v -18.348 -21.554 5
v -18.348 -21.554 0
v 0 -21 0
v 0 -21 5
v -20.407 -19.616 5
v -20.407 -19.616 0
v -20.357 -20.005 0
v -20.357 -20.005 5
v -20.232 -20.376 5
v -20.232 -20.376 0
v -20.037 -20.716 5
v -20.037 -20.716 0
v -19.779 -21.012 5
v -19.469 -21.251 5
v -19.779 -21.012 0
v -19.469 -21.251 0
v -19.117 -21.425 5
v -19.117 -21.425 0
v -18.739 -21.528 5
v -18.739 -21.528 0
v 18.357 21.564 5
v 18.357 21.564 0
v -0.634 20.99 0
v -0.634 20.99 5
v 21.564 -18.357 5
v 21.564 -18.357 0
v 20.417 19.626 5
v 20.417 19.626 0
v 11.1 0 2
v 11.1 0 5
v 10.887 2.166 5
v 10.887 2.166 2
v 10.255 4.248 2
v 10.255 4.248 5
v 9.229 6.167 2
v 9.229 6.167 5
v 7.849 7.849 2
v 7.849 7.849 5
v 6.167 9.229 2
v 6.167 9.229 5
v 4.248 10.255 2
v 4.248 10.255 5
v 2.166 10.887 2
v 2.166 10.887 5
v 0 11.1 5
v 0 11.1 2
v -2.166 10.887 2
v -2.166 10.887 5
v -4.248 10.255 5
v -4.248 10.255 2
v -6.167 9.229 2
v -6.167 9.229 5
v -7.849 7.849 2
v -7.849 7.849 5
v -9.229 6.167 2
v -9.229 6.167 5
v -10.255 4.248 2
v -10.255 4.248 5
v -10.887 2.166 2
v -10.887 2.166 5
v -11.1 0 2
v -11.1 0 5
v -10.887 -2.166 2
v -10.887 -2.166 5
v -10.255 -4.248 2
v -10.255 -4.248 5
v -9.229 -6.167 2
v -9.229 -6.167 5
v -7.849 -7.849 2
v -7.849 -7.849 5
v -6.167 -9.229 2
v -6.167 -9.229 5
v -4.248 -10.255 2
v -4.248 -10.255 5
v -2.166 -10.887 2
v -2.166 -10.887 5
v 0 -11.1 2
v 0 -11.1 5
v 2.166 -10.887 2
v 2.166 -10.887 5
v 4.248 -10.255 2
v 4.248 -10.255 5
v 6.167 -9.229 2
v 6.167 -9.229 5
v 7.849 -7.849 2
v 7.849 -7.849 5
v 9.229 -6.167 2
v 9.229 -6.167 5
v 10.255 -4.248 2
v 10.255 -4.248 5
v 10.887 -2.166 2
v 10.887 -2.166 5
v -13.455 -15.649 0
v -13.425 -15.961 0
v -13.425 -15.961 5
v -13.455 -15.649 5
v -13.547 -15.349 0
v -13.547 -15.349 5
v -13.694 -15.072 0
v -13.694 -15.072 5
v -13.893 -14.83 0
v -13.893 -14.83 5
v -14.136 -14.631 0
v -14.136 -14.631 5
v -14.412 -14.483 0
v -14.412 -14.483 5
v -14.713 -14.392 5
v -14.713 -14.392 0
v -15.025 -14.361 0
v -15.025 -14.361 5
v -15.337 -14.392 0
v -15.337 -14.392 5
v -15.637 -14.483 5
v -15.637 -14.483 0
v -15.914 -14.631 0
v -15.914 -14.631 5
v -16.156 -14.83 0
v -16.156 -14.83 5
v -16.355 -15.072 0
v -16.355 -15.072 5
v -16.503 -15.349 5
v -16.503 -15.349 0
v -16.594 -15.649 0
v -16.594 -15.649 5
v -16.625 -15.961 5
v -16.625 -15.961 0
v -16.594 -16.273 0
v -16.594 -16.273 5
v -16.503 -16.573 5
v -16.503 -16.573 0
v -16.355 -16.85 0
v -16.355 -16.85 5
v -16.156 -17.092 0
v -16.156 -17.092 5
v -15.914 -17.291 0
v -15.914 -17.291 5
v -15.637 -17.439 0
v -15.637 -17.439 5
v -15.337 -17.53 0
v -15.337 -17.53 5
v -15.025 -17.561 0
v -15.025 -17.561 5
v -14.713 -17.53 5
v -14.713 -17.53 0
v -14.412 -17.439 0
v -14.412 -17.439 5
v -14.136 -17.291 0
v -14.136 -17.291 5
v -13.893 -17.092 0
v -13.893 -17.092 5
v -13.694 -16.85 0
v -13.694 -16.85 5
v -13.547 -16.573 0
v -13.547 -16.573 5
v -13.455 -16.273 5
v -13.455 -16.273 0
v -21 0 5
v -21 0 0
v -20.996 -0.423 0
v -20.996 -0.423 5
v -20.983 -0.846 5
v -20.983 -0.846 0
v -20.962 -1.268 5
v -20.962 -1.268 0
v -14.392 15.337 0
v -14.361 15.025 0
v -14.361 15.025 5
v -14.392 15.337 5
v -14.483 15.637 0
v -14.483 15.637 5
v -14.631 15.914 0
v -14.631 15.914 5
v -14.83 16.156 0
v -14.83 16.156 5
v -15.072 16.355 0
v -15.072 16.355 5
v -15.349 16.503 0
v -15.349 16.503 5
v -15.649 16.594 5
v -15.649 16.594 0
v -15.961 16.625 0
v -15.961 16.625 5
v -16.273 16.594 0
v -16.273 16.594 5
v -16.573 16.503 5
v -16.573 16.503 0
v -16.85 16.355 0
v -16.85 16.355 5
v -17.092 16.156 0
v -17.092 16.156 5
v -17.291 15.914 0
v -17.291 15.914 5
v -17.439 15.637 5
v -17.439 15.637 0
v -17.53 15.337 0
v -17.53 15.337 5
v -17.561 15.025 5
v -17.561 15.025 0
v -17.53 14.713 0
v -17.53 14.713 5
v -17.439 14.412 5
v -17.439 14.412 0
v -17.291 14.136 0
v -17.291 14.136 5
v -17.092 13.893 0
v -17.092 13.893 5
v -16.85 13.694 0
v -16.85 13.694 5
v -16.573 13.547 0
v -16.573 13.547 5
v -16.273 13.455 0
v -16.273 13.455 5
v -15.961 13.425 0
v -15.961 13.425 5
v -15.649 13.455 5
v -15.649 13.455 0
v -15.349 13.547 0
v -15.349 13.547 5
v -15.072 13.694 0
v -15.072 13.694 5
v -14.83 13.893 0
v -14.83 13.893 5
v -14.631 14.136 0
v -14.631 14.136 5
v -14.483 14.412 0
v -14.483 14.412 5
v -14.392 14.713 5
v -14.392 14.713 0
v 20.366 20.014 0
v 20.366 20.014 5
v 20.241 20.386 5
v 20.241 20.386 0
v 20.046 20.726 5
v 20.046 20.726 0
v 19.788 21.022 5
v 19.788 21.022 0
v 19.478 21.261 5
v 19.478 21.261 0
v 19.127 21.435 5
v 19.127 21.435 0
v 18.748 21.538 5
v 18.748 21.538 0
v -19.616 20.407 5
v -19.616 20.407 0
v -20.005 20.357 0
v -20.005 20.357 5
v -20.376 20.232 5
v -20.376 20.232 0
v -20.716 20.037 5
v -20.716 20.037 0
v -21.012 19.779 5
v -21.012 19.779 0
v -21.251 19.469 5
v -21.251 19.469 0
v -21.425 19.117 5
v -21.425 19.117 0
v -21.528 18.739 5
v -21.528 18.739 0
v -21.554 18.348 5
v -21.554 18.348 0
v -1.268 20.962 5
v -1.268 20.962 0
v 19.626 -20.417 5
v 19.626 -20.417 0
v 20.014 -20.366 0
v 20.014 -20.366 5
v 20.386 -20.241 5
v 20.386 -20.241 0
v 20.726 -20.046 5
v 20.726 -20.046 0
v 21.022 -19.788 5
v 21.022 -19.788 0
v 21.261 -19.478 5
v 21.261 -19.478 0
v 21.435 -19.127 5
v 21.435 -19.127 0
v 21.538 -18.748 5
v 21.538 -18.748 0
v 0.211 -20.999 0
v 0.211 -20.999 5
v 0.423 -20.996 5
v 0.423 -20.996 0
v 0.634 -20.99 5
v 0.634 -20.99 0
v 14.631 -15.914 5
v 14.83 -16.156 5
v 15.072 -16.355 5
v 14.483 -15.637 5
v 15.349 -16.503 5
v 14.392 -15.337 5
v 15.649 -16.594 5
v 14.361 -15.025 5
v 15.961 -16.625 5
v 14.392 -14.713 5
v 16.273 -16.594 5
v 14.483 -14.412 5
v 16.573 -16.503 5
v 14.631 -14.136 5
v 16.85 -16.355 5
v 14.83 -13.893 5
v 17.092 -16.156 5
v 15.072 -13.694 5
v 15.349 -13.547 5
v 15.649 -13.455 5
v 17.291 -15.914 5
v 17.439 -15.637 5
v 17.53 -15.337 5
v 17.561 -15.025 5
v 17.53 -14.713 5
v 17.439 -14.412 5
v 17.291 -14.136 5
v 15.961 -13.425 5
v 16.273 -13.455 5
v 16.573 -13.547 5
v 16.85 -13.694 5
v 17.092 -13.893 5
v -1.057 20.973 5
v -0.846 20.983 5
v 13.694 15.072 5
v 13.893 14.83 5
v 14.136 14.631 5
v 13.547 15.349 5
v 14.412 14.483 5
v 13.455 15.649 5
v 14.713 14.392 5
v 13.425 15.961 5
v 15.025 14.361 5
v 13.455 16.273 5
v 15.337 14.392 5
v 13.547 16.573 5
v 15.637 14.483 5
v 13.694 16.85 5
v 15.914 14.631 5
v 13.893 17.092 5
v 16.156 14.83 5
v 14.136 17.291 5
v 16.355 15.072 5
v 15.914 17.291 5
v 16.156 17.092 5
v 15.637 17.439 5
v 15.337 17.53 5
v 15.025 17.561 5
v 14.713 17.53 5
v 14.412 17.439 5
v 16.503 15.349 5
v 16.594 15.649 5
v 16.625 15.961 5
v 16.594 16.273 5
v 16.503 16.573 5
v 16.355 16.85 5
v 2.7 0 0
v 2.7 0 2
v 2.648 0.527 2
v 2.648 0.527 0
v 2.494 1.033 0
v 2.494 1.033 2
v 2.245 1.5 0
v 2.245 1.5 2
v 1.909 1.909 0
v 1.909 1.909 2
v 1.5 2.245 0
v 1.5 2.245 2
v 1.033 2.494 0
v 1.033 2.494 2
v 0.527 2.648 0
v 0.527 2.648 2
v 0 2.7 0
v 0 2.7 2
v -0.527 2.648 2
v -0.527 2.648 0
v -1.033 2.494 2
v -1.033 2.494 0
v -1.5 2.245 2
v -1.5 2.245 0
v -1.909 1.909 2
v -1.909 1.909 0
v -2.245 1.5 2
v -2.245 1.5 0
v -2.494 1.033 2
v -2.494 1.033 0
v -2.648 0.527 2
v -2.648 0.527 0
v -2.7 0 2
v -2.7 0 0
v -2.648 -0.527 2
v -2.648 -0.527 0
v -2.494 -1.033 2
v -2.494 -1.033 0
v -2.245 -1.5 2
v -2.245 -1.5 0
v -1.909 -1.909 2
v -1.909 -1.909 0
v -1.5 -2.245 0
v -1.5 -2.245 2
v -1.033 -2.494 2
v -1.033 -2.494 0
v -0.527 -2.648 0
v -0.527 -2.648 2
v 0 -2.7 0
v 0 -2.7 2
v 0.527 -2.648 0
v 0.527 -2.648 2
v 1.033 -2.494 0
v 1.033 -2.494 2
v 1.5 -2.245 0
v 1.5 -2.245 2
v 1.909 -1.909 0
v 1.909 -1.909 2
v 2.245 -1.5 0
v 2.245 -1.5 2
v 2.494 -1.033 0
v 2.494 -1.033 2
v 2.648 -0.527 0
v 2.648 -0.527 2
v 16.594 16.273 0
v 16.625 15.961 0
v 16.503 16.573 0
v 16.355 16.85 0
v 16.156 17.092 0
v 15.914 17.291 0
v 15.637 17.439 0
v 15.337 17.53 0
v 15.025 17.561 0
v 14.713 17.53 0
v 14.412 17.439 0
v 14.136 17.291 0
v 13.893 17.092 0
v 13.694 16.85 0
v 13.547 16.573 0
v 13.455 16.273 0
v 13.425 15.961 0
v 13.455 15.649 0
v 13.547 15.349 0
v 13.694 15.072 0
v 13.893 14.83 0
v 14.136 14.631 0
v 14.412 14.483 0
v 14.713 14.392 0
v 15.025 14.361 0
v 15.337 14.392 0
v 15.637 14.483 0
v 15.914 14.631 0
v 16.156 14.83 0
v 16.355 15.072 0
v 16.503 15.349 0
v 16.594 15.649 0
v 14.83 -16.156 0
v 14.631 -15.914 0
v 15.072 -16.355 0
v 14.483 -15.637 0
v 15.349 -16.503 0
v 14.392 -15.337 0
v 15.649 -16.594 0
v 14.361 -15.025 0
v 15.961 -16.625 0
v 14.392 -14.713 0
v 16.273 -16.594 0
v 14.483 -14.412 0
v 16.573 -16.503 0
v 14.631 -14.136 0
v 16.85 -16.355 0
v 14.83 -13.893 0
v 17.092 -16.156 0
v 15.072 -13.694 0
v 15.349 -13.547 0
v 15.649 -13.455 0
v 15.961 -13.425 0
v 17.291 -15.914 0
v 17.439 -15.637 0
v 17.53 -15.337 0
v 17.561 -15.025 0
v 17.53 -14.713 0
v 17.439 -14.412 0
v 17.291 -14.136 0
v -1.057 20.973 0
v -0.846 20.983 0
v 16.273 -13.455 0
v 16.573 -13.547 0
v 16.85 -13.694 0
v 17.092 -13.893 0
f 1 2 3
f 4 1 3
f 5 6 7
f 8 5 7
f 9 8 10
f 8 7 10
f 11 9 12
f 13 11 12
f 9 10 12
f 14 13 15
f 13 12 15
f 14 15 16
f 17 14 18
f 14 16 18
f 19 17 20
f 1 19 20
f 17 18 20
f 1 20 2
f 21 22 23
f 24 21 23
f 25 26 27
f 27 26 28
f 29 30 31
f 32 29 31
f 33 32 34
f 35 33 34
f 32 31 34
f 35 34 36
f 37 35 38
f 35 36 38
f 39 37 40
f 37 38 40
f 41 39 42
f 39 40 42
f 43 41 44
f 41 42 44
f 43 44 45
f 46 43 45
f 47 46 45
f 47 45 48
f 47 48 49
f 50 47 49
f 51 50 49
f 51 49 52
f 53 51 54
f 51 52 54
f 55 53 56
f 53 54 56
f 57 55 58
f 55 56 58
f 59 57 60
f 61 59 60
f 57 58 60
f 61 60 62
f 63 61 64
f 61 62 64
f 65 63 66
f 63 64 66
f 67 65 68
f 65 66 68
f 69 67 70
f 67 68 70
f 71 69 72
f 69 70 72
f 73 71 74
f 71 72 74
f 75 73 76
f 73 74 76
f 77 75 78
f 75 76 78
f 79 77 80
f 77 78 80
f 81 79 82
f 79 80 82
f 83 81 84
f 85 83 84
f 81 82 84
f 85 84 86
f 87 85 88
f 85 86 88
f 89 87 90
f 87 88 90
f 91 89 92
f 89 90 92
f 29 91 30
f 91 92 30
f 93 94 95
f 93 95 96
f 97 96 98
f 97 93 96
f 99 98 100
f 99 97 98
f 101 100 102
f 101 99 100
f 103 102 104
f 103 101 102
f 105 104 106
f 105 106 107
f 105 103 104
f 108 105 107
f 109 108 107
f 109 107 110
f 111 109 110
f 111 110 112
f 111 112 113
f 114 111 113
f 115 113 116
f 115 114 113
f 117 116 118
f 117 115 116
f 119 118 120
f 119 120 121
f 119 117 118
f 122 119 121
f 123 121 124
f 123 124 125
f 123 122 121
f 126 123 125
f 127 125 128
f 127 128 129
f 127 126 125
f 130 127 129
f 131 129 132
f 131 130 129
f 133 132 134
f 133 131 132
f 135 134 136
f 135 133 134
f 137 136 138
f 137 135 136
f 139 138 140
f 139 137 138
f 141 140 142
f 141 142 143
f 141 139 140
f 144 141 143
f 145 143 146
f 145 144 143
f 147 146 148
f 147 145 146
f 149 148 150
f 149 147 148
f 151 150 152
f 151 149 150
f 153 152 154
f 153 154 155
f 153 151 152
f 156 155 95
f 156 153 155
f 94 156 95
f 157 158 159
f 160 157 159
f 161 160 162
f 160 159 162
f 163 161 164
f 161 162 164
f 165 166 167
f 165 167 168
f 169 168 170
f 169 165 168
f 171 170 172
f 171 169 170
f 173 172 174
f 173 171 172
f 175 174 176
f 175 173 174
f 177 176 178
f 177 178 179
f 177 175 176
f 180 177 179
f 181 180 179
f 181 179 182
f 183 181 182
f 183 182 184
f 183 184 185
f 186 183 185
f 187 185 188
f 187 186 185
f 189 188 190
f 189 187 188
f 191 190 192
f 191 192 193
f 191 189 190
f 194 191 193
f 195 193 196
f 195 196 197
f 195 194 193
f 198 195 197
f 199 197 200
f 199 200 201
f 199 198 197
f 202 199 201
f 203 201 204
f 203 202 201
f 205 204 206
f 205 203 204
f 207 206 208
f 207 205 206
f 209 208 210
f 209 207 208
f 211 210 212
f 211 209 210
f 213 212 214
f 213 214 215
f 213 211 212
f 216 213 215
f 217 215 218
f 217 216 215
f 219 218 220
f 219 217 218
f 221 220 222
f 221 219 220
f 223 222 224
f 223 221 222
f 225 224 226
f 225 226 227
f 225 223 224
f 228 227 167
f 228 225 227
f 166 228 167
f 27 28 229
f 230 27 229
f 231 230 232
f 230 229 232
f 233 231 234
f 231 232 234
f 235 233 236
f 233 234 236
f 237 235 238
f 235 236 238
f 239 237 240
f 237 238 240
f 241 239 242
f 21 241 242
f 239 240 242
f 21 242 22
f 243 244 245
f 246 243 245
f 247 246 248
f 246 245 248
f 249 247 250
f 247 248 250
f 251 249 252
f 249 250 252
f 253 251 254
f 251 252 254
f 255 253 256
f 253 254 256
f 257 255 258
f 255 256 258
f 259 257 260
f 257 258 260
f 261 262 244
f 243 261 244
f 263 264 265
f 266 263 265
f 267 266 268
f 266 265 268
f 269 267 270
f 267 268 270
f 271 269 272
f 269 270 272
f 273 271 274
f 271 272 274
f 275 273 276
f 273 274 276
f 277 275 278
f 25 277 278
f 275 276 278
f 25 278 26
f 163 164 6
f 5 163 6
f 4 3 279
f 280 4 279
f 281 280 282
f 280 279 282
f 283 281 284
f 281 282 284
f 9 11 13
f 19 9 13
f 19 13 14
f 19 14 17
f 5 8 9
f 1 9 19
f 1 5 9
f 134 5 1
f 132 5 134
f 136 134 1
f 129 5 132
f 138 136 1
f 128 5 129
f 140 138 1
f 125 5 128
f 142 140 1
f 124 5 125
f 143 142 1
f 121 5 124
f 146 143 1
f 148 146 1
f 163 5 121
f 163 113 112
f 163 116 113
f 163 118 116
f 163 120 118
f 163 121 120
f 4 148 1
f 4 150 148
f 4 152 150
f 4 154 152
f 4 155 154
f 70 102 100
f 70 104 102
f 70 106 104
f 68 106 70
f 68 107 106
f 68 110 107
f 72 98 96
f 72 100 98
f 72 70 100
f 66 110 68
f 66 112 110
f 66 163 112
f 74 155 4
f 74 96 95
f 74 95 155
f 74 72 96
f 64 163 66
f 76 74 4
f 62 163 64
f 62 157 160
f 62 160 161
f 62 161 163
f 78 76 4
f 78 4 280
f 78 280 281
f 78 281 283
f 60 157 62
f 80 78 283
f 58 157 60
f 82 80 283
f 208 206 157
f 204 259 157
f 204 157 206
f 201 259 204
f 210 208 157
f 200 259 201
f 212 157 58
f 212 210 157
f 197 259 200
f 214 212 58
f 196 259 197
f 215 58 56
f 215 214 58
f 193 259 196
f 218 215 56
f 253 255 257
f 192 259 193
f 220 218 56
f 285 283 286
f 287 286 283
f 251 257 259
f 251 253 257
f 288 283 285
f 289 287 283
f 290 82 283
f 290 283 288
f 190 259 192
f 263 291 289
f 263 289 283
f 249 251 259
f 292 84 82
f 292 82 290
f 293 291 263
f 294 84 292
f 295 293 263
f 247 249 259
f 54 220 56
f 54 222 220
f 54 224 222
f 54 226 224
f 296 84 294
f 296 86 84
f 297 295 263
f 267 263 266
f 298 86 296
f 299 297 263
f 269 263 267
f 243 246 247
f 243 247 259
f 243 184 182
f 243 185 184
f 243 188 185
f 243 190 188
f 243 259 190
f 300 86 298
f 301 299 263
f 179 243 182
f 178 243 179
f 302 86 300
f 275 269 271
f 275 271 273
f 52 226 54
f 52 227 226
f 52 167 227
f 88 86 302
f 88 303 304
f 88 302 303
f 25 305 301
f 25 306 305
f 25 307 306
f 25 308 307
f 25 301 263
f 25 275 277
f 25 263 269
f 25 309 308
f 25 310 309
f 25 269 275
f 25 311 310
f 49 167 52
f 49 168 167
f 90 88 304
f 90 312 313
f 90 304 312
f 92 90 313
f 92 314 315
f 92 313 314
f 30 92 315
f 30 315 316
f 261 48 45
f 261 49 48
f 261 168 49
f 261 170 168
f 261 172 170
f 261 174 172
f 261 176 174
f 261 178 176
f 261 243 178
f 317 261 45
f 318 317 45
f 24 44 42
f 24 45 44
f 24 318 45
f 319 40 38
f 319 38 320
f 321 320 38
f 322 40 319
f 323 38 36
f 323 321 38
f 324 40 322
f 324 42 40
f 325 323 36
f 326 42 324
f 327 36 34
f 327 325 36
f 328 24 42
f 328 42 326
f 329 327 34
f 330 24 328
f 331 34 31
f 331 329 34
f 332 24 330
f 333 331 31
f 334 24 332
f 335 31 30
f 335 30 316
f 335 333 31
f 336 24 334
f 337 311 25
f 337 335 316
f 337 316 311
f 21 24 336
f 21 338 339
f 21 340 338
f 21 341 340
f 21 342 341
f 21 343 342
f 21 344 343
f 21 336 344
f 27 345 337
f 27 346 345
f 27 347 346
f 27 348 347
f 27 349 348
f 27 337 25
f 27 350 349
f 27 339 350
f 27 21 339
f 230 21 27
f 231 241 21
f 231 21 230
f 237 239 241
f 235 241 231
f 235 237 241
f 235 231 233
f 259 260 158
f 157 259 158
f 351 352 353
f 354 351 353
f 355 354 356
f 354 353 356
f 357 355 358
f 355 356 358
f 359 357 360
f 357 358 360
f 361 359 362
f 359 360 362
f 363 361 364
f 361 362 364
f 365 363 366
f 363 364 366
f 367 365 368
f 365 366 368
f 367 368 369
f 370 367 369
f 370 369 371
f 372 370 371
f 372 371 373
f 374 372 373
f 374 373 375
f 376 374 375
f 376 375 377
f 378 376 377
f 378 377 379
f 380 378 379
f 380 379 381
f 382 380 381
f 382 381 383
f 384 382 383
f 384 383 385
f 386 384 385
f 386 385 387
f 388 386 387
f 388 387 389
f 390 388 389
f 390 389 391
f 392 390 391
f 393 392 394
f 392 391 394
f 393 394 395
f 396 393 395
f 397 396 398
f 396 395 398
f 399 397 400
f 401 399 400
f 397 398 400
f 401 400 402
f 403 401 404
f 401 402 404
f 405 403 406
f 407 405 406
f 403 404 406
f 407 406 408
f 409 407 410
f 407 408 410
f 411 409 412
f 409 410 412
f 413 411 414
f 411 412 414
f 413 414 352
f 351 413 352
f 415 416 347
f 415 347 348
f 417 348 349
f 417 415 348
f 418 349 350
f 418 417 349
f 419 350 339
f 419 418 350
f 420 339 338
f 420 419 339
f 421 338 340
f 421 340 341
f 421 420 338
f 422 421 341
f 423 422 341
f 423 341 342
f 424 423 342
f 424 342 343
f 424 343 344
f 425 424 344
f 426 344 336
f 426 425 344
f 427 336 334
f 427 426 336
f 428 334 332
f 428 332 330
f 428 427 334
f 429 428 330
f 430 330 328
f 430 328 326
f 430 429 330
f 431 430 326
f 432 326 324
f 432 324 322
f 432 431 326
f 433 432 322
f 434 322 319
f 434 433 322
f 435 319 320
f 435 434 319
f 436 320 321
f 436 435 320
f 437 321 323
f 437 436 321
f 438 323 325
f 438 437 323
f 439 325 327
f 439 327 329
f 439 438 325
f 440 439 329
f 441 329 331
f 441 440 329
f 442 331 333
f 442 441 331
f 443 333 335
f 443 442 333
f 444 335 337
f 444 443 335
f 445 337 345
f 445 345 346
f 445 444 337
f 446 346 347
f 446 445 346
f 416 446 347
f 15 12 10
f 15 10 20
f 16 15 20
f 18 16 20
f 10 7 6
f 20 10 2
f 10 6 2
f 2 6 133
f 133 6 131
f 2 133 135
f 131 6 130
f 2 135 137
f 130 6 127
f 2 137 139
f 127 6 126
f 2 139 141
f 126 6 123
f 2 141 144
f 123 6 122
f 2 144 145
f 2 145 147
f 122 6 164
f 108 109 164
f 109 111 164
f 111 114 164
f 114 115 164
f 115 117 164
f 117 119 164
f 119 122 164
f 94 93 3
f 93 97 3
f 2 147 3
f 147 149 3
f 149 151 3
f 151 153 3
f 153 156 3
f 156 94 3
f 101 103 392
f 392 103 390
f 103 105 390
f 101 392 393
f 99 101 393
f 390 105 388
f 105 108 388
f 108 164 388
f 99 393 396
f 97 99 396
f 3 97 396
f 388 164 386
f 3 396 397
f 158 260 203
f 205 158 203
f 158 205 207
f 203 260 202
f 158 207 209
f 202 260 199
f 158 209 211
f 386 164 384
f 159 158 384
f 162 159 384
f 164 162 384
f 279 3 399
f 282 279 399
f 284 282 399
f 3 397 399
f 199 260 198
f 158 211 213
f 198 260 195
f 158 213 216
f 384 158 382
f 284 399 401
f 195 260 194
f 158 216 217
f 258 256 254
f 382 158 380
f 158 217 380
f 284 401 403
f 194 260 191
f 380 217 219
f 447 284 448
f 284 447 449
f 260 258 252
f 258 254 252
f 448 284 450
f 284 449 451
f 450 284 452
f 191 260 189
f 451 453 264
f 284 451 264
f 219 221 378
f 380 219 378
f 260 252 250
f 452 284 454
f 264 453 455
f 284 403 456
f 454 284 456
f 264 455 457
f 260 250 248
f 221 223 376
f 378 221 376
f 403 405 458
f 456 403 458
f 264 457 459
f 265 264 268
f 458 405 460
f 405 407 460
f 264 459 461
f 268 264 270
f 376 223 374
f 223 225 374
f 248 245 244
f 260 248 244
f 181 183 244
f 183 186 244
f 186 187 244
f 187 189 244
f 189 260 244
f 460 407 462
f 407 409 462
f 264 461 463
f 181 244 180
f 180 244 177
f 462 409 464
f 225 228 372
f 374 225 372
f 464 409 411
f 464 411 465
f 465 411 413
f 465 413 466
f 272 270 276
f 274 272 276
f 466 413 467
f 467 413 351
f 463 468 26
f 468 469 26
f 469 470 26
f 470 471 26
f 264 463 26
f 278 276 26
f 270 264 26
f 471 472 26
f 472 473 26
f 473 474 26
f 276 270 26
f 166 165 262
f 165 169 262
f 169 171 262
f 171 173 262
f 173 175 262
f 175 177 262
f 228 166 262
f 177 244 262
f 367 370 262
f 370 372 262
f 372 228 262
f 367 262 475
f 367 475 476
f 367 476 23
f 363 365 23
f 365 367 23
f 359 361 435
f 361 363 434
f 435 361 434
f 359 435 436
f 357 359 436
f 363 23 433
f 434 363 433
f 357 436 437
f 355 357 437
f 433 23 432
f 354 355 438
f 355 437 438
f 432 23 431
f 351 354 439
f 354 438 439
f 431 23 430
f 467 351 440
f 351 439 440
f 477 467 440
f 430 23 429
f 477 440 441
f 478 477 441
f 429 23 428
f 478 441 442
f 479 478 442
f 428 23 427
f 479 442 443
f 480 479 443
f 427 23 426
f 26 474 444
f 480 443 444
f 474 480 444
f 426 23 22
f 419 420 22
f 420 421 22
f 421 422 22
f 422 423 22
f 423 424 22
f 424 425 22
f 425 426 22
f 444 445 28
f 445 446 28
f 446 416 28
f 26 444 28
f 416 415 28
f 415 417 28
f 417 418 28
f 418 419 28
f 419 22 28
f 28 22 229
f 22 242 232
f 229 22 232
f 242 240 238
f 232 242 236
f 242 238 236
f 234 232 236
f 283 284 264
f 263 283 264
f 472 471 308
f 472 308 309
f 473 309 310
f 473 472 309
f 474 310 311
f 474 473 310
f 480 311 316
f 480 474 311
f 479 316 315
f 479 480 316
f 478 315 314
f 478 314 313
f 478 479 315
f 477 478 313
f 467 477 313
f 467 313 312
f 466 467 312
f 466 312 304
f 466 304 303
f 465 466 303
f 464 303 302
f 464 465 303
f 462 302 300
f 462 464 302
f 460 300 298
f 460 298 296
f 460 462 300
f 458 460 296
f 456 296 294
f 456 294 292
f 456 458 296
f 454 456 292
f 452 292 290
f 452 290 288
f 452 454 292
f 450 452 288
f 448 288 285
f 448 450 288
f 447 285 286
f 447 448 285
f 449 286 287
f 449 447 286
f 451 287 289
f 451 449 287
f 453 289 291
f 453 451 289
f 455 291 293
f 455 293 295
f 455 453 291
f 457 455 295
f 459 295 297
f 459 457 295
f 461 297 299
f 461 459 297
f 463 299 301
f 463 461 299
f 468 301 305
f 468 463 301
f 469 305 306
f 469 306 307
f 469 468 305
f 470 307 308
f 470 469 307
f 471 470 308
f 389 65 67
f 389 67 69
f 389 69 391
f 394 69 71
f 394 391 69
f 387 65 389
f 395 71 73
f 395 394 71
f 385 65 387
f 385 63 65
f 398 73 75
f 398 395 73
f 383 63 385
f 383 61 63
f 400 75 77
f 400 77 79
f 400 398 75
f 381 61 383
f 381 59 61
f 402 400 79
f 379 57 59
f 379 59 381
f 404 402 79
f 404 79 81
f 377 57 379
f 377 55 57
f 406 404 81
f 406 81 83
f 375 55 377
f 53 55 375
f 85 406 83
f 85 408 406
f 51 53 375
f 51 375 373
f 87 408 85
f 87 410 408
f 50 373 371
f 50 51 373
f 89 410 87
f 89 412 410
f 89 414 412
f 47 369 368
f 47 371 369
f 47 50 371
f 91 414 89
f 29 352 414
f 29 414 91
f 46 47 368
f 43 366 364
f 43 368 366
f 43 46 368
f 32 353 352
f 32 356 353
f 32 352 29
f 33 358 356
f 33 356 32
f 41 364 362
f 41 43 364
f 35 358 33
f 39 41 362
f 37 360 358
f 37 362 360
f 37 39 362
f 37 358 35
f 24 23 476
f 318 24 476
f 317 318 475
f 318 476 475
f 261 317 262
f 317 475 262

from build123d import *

# Parameters (mm, degrees)
SKETCH1_R           = 1.6
BOSS_EXTRUDE1_DEPTH = 5
SKETCH3_R           = 11.1
CUT_EXTRUDE1_DEPTH  = 3
SKETCH4_R           = 2.7
CUT_EXTRUDE2_DEPTH  = 3


with BuildPart() as part:
    # Sketch1 → Boss-Extrude1 (new body)
    with BuildSketch(Plane.XY):
        with BuildLine():
            Line((18.357006817, 21.564329359), (-0.634323451, 20.990417665))
            ThreePointArc((-0.634323451, 20.990417665), (-0.95130426, 20.978441796), (-1.268068016, 20.961679406))
            Line((-1.268068016, 20.961679406), (-19.615786314, 20.407217452))
            ThreePointArc((-19.615786314, 20.407217452), (-21.011660375, 19.778980746), (-21.554461954, 18.347718298))
            Line((-21.554461954, 18.347718298), (-21, 0))
            ThreePointArc((-21, 0), (-20.990417665, -0.634323451), (-20.961679406, -1.268068016))
            Line((-20.961679406, -1.268068016), (-20.407217422, -19.615787304))
            ThreePointArc((-20.407217422, -19.615787304), (-19.778980677, -21.011661401), (-18.34771816, -21.55446294))
            Line((-18.34771816, -21.55446294), (0, -21))
            ThreePointArc((0, -21), (0.317197912, -20.99760428), (0.634323451, -20.990417665))
            Line((0.634323451, -20.990417665), (19.62565372, -20.416505971))
            ThreePointArc((19.62565372, -20.416505971), (21.02152778, -19.788269266), (21.564329359, -18.357006817))
            Line((21.564329359, -18.357006817), (20.416505971, 19.62565372))
            ThreePointArc((20.416505971, 19.62565372), (19.788269266, 21.02152778), (18.357006817, 21.564329359))
        make_face()
        with Locations((15.024736206, 15.961118443)):
            Circle(SKETCH1_R, mode=Mode.SUBTRACT)
        with Locations((15.961118443, -15.024736206)):
            Circle(SKETCH1_R, mode=Mode.SUBTRACT)
        with Locations((-15.024736206, -15.961118443)):
            Circle(SKETCH1_R, mode=Mode.SUBTRACT)
        with Locations((-15.961118443, 15.024736206)):
            Circle(SKETCH1_R, mode=Mode.SUBTRACT)
    extrude(amount=BOSS_EXTRUDE1_DEPTH)

    # Sketch3 → Cut-Extrude1 (cut)
    with BuildSketch(Plane.XY.offset(5)):
        Circle(SKETCH3_R)
    extrude(amount=-CUT_EXTRUDE1_DEPTH, mode=Mode.SUBTRACT)

    # Sketch4 → Cut-Extrude2 (cut)
    with BuildSketch(Plane.XY.offset(2)):
        Circle(SKETCH4_R)
    extrude(amount=-CUT_EXTRUDE2_DEPTH, mode=Mode.SUBTRACT)


solid = part.part
